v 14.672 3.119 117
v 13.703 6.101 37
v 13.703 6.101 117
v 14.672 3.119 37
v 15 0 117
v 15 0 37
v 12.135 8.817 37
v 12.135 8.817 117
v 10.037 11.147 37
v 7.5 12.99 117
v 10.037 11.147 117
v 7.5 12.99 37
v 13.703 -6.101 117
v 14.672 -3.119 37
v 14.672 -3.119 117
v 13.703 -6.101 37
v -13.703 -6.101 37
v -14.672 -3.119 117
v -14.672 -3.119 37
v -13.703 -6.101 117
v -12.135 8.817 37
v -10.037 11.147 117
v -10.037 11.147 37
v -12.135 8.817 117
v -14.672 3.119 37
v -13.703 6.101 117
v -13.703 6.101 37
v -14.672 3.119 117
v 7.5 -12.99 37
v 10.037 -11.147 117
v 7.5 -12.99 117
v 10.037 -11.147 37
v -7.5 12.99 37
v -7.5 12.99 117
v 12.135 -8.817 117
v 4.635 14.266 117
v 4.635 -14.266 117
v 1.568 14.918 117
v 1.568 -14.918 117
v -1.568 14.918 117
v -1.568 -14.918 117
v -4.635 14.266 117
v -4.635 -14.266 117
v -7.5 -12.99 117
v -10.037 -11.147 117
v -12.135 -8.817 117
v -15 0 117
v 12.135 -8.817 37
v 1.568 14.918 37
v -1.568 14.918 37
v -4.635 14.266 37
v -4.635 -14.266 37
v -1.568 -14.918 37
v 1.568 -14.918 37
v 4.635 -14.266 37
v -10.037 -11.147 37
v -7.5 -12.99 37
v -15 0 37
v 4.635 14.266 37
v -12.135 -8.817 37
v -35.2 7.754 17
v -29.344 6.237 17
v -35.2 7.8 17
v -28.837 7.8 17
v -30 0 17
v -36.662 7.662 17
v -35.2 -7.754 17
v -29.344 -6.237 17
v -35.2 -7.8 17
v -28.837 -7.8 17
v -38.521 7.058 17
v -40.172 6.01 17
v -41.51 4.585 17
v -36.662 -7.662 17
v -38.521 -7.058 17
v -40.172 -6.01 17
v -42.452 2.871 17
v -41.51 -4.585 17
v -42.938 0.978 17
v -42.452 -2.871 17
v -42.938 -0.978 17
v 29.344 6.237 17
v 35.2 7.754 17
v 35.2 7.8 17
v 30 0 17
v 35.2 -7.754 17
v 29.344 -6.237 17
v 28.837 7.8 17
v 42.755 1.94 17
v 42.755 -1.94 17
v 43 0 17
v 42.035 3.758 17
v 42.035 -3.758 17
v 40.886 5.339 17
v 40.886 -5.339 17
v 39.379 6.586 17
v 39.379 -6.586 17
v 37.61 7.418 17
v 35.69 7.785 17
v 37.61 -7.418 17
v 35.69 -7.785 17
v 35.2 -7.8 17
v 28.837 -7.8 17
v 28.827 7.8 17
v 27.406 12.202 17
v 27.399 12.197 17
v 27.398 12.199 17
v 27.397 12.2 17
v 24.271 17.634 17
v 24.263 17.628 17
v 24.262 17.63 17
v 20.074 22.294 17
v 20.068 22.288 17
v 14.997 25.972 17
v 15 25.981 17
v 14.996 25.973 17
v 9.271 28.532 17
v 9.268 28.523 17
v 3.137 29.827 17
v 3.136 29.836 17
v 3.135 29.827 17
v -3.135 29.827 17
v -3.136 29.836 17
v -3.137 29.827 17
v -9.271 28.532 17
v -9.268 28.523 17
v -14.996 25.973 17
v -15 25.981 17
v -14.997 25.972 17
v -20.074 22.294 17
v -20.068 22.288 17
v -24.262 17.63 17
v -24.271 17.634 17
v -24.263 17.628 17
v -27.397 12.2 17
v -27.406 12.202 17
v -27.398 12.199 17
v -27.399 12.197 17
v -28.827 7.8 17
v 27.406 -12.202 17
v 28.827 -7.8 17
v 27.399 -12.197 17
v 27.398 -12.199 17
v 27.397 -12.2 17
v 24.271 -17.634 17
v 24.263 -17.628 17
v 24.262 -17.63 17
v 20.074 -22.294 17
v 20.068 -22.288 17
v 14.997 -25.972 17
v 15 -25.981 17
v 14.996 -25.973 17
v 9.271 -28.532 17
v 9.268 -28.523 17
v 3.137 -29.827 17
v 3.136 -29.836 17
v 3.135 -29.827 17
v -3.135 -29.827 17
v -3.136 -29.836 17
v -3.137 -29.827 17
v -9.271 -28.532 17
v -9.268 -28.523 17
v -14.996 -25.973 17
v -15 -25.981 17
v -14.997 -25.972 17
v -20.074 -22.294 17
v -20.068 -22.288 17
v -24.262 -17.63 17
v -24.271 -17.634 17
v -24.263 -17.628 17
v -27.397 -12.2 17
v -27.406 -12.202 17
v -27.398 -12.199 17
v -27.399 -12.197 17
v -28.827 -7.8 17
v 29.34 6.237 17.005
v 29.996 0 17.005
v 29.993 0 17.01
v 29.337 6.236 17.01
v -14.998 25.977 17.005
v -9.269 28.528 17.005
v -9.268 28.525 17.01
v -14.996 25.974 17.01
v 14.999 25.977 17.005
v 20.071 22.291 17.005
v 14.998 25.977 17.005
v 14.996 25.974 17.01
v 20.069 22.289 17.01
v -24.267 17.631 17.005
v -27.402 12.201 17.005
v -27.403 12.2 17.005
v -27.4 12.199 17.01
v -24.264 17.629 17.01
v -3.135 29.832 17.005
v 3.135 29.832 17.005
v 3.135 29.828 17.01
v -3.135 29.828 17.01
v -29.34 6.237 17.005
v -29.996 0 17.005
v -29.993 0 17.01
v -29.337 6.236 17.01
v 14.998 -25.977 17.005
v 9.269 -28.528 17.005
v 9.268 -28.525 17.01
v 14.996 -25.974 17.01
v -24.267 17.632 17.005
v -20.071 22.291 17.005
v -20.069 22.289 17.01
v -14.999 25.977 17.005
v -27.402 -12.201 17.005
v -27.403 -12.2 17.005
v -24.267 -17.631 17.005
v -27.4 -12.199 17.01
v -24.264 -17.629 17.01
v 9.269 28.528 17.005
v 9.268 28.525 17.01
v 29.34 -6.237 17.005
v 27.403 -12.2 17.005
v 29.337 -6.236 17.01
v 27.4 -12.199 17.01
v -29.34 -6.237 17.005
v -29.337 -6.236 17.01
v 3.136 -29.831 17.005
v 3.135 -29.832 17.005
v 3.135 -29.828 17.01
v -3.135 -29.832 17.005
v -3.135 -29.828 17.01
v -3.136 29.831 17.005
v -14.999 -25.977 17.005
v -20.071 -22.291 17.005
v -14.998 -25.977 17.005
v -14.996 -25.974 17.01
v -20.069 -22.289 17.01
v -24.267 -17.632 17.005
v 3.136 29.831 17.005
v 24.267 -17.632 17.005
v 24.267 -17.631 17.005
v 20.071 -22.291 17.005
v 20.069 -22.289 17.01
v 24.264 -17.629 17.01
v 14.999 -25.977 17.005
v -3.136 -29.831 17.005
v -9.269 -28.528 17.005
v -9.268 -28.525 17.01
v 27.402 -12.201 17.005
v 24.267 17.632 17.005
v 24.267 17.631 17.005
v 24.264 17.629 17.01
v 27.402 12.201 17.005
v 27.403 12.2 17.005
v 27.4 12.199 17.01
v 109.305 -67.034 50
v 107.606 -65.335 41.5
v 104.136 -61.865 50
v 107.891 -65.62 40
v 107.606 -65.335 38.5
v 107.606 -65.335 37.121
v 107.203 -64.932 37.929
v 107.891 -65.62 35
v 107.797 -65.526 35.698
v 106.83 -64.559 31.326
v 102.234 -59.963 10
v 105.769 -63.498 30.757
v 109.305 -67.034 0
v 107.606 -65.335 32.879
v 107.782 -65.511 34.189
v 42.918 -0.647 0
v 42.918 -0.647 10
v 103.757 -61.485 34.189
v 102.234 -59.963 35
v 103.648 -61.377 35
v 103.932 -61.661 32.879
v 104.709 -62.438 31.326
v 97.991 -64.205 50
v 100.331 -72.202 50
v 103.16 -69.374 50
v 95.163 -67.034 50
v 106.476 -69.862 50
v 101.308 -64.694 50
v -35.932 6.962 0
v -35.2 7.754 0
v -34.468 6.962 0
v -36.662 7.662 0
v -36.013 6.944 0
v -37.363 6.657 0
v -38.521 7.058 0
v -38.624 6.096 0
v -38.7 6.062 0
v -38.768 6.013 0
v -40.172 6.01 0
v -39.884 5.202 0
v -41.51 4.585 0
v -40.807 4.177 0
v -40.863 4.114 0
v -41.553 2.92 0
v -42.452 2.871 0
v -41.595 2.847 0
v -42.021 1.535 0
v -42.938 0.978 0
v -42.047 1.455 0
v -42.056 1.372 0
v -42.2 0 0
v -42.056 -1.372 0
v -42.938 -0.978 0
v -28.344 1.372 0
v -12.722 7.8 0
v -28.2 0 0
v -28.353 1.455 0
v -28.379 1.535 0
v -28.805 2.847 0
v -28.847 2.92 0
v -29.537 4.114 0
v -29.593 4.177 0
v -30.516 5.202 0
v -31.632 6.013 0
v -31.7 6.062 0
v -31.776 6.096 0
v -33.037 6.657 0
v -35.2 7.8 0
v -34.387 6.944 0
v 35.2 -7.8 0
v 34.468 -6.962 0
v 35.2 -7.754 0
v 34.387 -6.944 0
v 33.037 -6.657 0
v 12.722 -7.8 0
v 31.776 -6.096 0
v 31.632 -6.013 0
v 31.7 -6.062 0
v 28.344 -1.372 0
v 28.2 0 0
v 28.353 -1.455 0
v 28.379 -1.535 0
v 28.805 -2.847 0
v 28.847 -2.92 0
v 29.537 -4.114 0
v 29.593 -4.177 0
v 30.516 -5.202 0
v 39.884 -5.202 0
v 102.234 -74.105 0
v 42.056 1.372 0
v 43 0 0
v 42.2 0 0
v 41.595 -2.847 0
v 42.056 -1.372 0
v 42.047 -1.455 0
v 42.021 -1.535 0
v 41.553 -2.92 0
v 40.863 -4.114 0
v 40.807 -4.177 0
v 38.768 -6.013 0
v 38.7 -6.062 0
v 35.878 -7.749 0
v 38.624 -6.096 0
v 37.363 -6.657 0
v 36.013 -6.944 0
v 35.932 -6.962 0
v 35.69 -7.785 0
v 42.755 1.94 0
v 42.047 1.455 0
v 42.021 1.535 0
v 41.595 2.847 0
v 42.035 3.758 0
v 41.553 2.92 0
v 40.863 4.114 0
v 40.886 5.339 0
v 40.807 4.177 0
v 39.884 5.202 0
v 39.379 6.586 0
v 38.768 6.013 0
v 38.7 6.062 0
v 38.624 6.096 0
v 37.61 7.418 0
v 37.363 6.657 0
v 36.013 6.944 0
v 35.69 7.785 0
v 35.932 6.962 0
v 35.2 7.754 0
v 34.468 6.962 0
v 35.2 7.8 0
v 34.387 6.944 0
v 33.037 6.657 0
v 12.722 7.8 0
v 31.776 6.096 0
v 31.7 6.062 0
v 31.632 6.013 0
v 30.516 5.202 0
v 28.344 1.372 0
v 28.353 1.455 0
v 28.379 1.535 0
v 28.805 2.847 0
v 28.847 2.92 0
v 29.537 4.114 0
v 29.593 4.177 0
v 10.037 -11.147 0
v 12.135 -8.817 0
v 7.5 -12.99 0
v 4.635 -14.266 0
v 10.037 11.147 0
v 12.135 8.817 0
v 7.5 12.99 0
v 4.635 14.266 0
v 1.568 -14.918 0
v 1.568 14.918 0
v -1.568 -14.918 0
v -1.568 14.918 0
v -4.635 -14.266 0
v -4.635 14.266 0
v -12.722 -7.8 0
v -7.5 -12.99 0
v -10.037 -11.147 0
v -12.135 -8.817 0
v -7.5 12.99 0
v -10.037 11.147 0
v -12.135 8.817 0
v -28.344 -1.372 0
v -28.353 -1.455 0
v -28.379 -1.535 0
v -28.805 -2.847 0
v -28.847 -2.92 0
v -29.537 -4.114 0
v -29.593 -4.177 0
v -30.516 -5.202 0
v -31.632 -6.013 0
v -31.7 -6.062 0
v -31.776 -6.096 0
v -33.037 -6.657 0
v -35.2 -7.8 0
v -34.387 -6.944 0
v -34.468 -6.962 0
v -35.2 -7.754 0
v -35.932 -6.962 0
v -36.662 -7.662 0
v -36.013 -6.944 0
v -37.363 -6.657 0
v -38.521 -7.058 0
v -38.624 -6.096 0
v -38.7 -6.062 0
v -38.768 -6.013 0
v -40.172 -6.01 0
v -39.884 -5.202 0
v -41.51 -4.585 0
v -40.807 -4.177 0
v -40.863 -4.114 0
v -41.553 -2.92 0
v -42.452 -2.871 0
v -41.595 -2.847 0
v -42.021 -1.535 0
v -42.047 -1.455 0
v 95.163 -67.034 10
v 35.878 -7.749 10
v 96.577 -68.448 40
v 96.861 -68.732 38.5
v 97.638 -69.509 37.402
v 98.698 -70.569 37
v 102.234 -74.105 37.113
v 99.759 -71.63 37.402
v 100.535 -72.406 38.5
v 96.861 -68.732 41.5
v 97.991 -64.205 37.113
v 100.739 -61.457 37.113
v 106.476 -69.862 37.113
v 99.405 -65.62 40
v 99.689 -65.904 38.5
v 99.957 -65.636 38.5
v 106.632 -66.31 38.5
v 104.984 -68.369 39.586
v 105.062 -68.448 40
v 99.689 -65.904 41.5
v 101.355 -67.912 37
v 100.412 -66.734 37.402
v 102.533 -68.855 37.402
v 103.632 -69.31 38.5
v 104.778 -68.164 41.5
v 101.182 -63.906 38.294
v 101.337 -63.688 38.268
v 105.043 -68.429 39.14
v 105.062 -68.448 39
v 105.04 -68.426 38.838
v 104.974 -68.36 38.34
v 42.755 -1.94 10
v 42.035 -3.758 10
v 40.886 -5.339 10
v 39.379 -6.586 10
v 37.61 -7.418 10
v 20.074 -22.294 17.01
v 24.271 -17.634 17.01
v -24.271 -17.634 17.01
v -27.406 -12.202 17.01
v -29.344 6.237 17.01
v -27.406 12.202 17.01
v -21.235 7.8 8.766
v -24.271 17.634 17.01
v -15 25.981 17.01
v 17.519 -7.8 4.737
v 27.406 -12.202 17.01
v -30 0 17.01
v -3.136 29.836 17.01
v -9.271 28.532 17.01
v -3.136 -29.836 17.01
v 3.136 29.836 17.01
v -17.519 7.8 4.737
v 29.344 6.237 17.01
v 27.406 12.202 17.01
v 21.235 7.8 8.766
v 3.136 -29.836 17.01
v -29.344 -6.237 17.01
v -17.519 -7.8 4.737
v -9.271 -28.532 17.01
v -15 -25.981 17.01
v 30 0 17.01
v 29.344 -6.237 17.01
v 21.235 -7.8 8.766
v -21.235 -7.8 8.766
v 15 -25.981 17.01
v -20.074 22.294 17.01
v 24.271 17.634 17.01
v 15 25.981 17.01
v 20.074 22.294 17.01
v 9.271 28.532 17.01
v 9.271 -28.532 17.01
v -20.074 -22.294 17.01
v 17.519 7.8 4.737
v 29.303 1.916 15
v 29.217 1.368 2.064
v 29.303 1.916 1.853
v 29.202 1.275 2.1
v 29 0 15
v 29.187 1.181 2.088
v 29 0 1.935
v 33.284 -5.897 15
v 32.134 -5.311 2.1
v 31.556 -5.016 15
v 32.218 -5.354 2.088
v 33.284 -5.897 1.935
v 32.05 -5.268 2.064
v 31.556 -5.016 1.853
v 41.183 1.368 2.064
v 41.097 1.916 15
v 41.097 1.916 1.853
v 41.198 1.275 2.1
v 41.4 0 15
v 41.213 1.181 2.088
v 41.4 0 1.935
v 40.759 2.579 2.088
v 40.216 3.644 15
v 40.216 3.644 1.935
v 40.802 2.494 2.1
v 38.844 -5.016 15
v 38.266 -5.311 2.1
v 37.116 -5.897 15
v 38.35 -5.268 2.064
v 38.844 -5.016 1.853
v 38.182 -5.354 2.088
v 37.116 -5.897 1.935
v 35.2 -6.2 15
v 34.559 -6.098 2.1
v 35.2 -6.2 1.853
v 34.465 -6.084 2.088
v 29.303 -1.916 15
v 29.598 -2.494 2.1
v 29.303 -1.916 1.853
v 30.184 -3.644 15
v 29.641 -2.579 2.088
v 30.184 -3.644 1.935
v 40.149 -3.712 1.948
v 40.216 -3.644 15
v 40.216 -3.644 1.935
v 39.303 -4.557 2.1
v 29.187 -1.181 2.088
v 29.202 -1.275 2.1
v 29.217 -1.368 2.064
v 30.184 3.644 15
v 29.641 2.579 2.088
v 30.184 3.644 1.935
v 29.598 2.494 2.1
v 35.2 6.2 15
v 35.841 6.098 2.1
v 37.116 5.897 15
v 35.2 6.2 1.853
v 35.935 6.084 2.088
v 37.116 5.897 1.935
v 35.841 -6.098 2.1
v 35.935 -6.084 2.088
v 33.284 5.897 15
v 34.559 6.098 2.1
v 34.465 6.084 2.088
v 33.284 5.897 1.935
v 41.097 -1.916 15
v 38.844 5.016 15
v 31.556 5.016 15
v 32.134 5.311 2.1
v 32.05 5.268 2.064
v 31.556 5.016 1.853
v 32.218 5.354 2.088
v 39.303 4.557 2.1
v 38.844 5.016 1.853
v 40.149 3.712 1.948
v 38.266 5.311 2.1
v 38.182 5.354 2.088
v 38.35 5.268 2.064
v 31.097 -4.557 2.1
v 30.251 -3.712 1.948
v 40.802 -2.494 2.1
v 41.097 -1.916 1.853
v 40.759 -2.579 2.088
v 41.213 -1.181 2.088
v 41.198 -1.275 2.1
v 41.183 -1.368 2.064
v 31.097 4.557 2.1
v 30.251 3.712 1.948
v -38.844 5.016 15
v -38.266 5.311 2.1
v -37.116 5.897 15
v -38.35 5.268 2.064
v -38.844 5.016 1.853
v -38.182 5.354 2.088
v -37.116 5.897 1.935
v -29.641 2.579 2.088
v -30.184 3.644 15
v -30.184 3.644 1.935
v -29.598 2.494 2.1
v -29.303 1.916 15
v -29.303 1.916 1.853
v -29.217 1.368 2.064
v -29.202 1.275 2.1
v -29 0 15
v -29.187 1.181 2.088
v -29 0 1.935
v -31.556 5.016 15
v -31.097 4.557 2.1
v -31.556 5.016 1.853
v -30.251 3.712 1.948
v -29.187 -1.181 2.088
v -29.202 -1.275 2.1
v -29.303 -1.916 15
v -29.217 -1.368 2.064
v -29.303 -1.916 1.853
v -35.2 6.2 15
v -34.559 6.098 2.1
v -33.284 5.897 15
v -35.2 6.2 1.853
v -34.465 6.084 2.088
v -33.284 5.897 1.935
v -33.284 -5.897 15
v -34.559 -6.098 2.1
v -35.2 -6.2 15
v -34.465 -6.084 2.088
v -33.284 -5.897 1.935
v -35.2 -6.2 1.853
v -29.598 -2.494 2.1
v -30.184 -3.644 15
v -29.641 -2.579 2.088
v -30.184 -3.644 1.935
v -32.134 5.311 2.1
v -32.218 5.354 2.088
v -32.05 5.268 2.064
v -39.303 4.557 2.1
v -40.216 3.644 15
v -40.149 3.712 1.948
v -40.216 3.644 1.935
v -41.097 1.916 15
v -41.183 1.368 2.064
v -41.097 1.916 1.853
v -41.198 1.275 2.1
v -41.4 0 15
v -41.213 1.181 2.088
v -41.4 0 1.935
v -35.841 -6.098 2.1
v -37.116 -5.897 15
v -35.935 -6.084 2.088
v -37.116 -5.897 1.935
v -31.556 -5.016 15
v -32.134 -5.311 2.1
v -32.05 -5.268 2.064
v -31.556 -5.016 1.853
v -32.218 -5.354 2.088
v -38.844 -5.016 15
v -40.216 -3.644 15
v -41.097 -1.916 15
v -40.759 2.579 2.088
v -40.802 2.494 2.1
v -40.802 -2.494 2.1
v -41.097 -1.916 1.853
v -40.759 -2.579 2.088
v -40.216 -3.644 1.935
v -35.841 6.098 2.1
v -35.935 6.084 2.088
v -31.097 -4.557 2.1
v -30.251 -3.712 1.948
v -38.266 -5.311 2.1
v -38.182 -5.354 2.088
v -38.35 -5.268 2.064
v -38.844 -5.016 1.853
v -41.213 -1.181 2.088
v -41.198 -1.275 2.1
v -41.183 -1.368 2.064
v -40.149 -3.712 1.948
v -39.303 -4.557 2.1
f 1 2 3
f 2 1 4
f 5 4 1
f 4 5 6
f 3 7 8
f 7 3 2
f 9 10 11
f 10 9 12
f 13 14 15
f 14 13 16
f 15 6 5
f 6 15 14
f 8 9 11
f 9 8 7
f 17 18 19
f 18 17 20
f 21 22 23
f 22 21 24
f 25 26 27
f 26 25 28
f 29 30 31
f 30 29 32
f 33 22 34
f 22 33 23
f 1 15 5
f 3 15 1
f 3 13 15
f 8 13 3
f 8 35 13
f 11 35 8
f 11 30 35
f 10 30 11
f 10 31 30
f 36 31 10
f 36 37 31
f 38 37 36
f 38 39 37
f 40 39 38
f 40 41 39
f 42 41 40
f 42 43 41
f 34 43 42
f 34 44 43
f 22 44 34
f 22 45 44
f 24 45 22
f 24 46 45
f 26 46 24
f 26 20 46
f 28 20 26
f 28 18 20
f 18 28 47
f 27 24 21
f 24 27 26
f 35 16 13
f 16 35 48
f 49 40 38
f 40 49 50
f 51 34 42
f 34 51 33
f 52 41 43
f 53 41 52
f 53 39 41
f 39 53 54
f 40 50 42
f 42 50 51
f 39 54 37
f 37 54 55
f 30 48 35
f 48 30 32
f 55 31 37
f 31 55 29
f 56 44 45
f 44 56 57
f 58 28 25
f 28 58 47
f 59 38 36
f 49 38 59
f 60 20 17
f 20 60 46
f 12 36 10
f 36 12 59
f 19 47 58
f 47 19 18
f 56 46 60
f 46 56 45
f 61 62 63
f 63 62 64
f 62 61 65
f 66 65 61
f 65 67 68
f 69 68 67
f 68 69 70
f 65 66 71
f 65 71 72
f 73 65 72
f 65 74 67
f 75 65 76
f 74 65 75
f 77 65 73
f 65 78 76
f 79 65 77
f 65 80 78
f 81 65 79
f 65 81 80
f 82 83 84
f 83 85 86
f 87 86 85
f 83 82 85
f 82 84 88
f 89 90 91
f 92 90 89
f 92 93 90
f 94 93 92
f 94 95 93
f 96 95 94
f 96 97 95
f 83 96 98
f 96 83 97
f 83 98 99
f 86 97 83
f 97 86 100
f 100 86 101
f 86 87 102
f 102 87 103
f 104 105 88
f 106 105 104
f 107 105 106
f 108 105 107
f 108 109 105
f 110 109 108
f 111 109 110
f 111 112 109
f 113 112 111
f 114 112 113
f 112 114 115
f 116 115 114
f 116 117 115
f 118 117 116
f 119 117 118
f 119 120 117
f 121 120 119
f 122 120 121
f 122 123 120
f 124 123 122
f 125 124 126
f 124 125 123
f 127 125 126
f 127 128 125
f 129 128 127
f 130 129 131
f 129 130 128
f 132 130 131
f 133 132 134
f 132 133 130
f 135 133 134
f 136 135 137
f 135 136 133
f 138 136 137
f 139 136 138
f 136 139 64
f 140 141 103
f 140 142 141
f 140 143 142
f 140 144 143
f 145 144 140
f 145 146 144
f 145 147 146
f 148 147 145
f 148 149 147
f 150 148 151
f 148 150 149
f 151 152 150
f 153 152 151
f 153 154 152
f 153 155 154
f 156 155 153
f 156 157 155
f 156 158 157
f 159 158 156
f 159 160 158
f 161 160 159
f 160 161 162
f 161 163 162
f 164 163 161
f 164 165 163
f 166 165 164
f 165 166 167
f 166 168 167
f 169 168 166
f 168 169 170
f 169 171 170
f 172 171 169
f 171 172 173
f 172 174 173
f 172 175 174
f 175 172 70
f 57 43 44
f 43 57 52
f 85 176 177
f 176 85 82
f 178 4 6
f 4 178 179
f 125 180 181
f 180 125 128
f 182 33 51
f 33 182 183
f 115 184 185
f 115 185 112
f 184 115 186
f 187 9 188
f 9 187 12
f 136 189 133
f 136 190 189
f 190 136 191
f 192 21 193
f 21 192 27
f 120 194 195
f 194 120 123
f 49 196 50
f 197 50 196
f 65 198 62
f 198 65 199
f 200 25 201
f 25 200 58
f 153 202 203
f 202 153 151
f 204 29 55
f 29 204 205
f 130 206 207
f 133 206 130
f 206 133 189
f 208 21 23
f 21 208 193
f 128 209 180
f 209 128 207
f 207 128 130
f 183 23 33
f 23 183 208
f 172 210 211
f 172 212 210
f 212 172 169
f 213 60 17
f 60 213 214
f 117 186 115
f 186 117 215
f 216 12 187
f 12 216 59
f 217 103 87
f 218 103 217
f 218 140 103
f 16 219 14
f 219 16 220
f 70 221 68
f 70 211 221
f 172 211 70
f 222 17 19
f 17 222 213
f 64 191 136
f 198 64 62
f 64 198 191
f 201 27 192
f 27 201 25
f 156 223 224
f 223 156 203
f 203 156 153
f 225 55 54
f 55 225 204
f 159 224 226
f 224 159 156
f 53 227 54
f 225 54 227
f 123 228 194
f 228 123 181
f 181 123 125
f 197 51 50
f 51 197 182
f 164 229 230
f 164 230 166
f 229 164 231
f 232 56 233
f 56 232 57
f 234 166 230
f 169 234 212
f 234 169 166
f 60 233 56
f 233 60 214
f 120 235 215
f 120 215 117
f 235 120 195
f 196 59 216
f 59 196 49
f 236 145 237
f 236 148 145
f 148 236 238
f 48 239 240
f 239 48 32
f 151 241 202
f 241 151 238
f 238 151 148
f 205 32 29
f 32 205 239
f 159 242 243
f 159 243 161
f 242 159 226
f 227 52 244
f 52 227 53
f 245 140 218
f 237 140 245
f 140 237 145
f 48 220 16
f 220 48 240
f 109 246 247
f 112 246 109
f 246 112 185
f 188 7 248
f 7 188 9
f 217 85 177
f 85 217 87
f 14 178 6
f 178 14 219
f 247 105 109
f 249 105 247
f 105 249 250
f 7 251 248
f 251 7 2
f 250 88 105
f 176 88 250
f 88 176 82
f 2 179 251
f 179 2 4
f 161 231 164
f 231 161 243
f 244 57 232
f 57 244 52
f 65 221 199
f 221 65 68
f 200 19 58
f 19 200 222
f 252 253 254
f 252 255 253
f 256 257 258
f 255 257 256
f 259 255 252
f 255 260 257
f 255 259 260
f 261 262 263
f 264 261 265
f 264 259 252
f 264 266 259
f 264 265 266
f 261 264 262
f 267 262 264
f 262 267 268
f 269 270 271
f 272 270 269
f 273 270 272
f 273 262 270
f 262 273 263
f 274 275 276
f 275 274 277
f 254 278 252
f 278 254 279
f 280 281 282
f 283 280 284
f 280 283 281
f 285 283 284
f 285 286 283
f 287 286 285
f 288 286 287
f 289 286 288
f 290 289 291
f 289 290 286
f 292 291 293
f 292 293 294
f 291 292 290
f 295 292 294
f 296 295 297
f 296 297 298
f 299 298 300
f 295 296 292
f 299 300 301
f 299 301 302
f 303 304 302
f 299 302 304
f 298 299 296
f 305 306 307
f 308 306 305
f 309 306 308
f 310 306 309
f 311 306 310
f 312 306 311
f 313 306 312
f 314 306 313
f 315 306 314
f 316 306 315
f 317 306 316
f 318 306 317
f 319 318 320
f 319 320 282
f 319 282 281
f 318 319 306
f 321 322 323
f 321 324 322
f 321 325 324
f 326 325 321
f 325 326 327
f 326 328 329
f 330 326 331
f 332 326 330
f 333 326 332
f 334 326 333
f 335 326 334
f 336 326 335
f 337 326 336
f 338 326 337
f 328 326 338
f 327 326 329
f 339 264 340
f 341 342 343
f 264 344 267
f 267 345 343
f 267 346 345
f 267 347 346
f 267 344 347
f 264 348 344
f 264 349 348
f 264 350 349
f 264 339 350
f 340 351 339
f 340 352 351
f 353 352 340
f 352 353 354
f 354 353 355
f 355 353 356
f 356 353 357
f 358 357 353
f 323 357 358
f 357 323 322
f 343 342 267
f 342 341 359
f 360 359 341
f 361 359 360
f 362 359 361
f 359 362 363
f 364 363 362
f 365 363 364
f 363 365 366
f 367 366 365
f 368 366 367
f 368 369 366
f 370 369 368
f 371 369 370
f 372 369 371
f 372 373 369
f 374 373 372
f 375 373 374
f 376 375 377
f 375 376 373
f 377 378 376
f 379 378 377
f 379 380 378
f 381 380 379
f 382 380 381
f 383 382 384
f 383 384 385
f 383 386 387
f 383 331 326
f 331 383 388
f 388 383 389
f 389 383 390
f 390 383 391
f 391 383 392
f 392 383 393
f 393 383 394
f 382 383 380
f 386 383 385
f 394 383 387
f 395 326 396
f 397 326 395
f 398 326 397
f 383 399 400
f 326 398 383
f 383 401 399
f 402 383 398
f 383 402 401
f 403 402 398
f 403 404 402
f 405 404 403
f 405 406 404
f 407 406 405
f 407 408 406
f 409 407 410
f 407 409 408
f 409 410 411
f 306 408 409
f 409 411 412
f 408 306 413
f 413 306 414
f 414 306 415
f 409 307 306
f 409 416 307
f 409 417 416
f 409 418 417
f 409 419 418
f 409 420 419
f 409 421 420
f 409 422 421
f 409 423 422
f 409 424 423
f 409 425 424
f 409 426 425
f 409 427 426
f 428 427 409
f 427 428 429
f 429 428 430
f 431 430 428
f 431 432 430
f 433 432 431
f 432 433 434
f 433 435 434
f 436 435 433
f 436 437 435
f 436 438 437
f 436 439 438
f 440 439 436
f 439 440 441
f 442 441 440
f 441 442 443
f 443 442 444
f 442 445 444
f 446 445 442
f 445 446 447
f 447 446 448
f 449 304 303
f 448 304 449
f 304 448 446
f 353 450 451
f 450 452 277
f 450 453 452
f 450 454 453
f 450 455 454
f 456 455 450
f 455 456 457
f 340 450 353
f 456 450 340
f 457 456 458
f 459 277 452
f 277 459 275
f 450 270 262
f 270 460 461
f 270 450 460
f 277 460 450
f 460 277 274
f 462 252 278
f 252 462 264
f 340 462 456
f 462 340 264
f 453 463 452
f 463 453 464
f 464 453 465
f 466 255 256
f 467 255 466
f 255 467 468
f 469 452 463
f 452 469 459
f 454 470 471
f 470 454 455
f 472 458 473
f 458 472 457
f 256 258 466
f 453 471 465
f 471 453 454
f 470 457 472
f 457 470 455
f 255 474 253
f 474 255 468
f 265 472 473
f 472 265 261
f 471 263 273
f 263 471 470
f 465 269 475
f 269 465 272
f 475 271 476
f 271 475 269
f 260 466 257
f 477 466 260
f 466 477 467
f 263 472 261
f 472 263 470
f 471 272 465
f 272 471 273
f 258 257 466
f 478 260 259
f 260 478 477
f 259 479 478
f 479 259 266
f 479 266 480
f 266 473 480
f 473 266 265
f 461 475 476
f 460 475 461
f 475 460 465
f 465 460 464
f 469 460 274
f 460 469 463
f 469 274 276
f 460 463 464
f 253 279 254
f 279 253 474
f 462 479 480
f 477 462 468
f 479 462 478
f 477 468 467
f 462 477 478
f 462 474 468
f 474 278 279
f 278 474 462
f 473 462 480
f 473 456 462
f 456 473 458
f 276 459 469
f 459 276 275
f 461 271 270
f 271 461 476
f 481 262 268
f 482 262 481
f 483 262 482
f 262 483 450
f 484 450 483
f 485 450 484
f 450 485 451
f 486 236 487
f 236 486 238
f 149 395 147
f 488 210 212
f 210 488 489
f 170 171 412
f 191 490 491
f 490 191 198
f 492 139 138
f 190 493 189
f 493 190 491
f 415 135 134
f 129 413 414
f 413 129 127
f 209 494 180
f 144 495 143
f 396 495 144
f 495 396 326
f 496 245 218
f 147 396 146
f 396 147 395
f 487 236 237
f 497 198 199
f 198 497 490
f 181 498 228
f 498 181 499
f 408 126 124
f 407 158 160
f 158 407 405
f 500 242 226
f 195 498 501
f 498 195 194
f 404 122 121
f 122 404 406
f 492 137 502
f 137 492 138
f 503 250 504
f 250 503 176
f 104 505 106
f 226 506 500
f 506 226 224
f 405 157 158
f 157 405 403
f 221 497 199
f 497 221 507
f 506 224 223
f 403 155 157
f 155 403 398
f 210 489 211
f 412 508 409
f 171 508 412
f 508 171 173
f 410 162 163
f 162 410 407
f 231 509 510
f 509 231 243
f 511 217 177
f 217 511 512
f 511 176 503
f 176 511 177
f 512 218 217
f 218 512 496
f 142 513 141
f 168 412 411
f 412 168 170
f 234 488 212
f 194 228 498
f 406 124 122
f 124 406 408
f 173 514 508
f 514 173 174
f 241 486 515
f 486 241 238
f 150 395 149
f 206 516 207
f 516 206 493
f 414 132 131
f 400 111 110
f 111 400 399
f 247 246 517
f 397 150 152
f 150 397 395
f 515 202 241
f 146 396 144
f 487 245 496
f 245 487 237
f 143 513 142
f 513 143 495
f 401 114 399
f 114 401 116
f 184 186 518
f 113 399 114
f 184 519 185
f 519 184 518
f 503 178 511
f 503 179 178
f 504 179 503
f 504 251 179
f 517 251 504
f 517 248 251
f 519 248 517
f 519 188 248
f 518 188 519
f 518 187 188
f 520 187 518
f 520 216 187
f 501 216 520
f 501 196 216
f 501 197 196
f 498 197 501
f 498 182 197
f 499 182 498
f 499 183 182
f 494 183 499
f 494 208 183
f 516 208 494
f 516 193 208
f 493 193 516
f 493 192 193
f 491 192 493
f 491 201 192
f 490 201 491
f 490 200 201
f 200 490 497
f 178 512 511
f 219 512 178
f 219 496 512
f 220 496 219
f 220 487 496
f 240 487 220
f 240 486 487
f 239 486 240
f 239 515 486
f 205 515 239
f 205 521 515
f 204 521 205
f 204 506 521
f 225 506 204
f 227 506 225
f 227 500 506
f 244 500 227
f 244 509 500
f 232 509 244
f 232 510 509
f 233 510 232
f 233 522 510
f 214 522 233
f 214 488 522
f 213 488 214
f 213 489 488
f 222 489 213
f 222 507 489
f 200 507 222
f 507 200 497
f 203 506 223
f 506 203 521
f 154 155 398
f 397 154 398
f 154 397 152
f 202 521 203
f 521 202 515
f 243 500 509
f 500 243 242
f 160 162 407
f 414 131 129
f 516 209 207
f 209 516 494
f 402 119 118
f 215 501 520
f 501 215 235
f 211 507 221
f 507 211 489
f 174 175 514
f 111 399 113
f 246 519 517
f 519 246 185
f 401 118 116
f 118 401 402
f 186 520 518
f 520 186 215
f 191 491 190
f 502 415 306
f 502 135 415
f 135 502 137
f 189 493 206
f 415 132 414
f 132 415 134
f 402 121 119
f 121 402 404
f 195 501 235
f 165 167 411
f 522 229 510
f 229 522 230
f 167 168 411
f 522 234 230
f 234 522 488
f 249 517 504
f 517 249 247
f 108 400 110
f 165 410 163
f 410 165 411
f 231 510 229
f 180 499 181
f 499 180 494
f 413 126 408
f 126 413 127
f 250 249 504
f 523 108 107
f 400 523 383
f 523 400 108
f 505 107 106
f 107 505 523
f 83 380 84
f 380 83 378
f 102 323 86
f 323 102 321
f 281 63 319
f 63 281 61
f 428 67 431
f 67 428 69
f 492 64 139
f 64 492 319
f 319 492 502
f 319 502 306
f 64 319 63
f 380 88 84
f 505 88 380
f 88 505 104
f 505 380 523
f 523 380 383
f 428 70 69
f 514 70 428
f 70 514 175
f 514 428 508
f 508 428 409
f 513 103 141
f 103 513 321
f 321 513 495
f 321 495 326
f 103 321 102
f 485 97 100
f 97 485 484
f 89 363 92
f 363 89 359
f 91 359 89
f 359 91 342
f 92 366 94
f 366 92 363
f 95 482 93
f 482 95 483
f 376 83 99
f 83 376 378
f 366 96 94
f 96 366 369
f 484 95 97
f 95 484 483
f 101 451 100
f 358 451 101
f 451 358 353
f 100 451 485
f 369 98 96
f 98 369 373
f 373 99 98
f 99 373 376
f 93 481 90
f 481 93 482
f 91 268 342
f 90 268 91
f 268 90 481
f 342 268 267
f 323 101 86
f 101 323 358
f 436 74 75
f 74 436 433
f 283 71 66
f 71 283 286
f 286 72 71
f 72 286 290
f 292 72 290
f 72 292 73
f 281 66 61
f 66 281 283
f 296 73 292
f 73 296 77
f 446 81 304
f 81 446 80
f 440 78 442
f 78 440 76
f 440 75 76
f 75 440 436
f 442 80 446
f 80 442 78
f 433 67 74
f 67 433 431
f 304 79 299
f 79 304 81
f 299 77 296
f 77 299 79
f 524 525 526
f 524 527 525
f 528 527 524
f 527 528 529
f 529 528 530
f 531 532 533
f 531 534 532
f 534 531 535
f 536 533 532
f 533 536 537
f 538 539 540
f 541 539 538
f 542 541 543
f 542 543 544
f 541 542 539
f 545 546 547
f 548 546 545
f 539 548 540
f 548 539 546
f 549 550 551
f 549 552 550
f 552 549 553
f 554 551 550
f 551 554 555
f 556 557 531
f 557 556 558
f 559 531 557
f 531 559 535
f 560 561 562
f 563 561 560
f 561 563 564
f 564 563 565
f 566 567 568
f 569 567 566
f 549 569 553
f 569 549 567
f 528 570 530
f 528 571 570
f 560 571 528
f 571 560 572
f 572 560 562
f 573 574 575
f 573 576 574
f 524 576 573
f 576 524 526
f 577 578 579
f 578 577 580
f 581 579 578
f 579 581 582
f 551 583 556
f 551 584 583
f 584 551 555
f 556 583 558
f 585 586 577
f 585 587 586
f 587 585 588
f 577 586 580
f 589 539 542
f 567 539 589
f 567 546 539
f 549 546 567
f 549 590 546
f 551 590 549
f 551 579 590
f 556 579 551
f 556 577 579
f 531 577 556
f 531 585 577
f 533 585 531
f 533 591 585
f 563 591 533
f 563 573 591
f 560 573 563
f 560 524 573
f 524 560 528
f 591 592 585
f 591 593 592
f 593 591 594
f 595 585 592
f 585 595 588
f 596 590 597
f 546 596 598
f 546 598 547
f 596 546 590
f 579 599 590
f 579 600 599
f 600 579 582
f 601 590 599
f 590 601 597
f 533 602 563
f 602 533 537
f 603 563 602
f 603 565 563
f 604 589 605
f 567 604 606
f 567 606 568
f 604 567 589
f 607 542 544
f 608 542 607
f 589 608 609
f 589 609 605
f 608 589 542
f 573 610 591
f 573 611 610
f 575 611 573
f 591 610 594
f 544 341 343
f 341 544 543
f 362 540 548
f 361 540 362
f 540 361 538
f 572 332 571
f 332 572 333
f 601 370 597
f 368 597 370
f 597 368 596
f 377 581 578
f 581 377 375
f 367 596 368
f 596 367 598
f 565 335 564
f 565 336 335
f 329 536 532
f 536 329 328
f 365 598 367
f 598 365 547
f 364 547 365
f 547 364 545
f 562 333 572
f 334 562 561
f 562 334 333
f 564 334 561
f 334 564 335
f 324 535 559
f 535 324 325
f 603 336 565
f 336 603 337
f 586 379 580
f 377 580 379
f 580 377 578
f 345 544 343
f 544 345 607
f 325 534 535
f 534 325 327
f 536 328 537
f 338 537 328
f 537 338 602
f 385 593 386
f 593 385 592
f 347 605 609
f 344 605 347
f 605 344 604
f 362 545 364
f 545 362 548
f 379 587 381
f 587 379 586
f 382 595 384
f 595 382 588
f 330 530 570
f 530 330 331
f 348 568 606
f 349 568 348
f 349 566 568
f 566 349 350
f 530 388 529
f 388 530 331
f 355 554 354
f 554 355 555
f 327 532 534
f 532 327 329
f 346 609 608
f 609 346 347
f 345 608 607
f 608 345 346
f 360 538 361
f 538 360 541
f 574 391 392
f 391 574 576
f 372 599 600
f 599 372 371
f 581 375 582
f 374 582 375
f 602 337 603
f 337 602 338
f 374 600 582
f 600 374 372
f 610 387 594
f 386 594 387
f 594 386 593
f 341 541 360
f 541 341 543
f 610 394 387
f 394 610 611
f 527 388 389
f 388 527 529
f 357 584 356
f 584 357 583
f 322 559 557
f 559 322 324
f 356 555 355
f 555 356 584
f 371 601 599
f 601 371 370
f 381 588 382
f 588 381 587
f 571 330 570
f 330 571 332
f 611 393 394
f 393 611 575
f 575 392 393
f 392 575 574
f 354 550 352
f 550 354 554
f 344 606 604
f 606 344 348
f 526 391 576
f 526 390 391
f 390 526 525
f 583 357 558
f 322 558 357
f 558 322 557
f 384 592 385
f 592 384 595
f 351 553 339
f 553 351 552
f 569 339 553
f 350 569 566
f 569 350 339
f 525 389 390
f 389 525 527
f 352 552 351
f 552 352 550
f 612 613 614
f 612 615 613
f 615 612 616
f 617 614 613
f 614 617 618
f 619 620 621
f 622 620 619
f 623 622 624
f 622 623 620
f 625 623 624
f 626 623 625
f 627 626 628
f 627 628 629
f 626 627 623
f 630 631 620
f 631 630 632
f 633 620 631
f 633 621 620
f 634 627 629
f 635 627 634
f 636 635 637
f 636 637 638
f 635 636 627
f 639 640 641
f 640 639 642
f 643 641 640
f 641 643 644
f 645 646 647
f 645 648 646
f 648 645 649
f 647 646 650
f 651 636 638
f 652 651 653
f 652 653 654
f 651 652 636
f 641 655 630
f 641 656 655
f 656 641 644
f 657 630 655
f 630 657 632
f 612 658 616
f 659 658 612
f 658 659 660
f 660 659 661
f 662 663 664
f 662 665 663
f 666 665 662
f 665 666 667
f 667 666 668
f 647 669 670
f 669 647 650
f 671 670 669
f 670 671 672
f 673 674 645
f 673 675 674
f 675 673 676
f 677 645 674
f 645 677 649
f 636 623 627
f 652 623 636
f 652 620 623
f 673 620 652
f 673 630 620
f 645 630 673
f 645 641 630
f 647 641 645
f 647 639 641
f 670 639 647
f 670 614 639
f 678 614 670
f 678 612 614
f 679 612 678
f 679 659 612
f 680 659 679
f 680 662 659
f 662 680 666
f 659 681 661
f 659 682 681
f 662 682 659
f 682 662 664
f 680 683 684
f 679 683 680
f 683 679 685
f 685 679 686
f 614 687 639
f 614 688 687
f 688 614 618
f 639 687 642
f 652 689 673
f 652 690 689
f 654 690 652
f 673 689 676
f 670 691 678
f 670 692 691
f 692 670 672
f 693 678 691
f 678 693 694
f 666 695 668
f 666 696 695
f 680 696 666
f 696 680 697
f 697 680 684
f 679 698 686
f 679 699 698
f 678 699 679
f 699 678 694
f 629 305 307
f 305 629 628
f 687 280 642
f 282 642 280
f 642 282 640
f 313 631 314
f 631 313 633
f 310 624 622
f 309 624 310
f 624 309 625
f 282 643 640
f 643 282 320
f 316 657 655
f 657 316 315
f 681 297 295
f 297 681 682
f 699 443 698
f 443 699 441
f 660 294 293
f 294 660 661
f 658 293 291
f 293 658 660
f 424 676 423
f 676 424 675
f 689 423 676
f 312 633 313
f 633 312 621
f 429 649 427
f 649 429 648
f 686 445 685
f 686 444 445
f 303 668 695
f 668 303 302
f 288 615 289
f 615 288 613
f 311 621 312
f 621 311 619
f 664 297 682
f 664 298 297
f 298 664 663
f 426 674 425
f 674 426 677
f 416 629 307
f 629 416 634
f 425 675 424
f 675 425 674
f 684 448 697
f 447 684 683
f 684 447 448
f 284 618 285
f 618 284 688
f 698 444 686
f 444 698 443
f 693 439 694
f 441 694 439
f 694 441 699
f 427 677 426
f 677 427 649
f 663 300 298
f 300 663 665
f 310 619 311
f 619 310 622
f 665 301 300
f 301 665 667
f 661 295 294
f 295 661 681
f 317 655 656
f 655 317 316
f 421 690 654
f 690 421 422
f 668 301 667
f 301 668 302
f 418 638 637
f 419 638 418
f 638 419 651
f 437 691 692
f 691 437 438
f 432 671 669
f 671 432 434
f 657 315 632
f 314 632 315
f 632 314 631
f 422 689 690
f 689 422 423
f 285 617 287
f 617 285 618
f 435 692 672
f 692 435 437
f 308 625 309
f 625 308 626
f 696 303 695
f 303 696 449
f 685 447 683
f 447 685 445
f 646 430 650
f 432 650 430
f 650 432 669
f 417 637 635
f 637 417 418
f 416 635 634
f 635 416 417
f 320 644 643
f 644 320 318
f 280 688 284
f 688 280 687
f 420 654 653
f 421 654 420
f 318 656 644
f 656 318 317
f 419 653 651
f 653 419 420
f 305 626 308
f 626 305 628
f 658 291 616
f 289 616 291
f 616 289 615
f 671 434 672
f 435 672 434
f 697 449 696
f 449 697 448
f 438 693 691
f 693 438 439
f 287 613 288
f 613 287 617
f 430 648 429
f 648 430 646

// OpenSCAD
// printrbot spool holder

// Radius of spool holder
Rspool=15;
// Height of spool holder
H=100;
// Radius of Z-rods (adjust fit here)
R=6.2;
// Path width of single trace of plastic
w1=.4;
// Distance between Z-rods (inside measurement)
D=58;
// Length of guide arm
L=130;

w=w1*4;
d=D/2+R;

difference(){
	union(){
		translate([0,0,17]){
			cylinder(r=Rspool,h=H);
			cylinder(r1=30,r2=0,h=40);
		}
		cylinder(r1=15,r2=30,h=17.01);
		translate([0,0,17/2])cube([2*d,2*(R+w),17],center=true);
		translate([d,0,0])cylinder(r=R+w,h=17);
		translate([-d,0,0])cylinder(r=R+w,h=17);
		translate([d,0,0])rotate([0,0,-45]){
			translate([0,-5,0])cube([L-d,10,10]);
			translate([L-d,0,0])rotate([0,0,90])guide();
		}
	}
	translate([d,0,0])cylinder(r=R,h=30,center=true);
	translate([d,0,0])cylinder(r1=2*R+0.8,r2=0.8,h=30,center=true);
	translate([-d,0,0])cylinder(r=R,h=30,center=true);
	translate([-d,0,0])cylinder(r1=2*R+0.8,r2=0.8,h=30,center=true);
}

module guide()
difference(){	
	translate([-5,-5,0])cube([10,10,50]);
	translate([0,0,40])rotate([0,90,0])cylinder(r=3,h=20,center=true,$fn=12);
	translate([0,0,40])rotate([0,135,0])cylinder(r=3,h=20,$fn=12);
	//mirror([0,1,0]){
		translate([0,0,40])rotate([-30,0,0])translate([-1,-3,0])cube(20);
		translate([0,0,40])rotate([-30,0,180])translate([-1,-3,0])cube(20);
		translate([0,0,40])rotate([0,45,0])cube(20);
	//}
	translate([0,0,50])cube([2,20,20],center=true);
	
}
